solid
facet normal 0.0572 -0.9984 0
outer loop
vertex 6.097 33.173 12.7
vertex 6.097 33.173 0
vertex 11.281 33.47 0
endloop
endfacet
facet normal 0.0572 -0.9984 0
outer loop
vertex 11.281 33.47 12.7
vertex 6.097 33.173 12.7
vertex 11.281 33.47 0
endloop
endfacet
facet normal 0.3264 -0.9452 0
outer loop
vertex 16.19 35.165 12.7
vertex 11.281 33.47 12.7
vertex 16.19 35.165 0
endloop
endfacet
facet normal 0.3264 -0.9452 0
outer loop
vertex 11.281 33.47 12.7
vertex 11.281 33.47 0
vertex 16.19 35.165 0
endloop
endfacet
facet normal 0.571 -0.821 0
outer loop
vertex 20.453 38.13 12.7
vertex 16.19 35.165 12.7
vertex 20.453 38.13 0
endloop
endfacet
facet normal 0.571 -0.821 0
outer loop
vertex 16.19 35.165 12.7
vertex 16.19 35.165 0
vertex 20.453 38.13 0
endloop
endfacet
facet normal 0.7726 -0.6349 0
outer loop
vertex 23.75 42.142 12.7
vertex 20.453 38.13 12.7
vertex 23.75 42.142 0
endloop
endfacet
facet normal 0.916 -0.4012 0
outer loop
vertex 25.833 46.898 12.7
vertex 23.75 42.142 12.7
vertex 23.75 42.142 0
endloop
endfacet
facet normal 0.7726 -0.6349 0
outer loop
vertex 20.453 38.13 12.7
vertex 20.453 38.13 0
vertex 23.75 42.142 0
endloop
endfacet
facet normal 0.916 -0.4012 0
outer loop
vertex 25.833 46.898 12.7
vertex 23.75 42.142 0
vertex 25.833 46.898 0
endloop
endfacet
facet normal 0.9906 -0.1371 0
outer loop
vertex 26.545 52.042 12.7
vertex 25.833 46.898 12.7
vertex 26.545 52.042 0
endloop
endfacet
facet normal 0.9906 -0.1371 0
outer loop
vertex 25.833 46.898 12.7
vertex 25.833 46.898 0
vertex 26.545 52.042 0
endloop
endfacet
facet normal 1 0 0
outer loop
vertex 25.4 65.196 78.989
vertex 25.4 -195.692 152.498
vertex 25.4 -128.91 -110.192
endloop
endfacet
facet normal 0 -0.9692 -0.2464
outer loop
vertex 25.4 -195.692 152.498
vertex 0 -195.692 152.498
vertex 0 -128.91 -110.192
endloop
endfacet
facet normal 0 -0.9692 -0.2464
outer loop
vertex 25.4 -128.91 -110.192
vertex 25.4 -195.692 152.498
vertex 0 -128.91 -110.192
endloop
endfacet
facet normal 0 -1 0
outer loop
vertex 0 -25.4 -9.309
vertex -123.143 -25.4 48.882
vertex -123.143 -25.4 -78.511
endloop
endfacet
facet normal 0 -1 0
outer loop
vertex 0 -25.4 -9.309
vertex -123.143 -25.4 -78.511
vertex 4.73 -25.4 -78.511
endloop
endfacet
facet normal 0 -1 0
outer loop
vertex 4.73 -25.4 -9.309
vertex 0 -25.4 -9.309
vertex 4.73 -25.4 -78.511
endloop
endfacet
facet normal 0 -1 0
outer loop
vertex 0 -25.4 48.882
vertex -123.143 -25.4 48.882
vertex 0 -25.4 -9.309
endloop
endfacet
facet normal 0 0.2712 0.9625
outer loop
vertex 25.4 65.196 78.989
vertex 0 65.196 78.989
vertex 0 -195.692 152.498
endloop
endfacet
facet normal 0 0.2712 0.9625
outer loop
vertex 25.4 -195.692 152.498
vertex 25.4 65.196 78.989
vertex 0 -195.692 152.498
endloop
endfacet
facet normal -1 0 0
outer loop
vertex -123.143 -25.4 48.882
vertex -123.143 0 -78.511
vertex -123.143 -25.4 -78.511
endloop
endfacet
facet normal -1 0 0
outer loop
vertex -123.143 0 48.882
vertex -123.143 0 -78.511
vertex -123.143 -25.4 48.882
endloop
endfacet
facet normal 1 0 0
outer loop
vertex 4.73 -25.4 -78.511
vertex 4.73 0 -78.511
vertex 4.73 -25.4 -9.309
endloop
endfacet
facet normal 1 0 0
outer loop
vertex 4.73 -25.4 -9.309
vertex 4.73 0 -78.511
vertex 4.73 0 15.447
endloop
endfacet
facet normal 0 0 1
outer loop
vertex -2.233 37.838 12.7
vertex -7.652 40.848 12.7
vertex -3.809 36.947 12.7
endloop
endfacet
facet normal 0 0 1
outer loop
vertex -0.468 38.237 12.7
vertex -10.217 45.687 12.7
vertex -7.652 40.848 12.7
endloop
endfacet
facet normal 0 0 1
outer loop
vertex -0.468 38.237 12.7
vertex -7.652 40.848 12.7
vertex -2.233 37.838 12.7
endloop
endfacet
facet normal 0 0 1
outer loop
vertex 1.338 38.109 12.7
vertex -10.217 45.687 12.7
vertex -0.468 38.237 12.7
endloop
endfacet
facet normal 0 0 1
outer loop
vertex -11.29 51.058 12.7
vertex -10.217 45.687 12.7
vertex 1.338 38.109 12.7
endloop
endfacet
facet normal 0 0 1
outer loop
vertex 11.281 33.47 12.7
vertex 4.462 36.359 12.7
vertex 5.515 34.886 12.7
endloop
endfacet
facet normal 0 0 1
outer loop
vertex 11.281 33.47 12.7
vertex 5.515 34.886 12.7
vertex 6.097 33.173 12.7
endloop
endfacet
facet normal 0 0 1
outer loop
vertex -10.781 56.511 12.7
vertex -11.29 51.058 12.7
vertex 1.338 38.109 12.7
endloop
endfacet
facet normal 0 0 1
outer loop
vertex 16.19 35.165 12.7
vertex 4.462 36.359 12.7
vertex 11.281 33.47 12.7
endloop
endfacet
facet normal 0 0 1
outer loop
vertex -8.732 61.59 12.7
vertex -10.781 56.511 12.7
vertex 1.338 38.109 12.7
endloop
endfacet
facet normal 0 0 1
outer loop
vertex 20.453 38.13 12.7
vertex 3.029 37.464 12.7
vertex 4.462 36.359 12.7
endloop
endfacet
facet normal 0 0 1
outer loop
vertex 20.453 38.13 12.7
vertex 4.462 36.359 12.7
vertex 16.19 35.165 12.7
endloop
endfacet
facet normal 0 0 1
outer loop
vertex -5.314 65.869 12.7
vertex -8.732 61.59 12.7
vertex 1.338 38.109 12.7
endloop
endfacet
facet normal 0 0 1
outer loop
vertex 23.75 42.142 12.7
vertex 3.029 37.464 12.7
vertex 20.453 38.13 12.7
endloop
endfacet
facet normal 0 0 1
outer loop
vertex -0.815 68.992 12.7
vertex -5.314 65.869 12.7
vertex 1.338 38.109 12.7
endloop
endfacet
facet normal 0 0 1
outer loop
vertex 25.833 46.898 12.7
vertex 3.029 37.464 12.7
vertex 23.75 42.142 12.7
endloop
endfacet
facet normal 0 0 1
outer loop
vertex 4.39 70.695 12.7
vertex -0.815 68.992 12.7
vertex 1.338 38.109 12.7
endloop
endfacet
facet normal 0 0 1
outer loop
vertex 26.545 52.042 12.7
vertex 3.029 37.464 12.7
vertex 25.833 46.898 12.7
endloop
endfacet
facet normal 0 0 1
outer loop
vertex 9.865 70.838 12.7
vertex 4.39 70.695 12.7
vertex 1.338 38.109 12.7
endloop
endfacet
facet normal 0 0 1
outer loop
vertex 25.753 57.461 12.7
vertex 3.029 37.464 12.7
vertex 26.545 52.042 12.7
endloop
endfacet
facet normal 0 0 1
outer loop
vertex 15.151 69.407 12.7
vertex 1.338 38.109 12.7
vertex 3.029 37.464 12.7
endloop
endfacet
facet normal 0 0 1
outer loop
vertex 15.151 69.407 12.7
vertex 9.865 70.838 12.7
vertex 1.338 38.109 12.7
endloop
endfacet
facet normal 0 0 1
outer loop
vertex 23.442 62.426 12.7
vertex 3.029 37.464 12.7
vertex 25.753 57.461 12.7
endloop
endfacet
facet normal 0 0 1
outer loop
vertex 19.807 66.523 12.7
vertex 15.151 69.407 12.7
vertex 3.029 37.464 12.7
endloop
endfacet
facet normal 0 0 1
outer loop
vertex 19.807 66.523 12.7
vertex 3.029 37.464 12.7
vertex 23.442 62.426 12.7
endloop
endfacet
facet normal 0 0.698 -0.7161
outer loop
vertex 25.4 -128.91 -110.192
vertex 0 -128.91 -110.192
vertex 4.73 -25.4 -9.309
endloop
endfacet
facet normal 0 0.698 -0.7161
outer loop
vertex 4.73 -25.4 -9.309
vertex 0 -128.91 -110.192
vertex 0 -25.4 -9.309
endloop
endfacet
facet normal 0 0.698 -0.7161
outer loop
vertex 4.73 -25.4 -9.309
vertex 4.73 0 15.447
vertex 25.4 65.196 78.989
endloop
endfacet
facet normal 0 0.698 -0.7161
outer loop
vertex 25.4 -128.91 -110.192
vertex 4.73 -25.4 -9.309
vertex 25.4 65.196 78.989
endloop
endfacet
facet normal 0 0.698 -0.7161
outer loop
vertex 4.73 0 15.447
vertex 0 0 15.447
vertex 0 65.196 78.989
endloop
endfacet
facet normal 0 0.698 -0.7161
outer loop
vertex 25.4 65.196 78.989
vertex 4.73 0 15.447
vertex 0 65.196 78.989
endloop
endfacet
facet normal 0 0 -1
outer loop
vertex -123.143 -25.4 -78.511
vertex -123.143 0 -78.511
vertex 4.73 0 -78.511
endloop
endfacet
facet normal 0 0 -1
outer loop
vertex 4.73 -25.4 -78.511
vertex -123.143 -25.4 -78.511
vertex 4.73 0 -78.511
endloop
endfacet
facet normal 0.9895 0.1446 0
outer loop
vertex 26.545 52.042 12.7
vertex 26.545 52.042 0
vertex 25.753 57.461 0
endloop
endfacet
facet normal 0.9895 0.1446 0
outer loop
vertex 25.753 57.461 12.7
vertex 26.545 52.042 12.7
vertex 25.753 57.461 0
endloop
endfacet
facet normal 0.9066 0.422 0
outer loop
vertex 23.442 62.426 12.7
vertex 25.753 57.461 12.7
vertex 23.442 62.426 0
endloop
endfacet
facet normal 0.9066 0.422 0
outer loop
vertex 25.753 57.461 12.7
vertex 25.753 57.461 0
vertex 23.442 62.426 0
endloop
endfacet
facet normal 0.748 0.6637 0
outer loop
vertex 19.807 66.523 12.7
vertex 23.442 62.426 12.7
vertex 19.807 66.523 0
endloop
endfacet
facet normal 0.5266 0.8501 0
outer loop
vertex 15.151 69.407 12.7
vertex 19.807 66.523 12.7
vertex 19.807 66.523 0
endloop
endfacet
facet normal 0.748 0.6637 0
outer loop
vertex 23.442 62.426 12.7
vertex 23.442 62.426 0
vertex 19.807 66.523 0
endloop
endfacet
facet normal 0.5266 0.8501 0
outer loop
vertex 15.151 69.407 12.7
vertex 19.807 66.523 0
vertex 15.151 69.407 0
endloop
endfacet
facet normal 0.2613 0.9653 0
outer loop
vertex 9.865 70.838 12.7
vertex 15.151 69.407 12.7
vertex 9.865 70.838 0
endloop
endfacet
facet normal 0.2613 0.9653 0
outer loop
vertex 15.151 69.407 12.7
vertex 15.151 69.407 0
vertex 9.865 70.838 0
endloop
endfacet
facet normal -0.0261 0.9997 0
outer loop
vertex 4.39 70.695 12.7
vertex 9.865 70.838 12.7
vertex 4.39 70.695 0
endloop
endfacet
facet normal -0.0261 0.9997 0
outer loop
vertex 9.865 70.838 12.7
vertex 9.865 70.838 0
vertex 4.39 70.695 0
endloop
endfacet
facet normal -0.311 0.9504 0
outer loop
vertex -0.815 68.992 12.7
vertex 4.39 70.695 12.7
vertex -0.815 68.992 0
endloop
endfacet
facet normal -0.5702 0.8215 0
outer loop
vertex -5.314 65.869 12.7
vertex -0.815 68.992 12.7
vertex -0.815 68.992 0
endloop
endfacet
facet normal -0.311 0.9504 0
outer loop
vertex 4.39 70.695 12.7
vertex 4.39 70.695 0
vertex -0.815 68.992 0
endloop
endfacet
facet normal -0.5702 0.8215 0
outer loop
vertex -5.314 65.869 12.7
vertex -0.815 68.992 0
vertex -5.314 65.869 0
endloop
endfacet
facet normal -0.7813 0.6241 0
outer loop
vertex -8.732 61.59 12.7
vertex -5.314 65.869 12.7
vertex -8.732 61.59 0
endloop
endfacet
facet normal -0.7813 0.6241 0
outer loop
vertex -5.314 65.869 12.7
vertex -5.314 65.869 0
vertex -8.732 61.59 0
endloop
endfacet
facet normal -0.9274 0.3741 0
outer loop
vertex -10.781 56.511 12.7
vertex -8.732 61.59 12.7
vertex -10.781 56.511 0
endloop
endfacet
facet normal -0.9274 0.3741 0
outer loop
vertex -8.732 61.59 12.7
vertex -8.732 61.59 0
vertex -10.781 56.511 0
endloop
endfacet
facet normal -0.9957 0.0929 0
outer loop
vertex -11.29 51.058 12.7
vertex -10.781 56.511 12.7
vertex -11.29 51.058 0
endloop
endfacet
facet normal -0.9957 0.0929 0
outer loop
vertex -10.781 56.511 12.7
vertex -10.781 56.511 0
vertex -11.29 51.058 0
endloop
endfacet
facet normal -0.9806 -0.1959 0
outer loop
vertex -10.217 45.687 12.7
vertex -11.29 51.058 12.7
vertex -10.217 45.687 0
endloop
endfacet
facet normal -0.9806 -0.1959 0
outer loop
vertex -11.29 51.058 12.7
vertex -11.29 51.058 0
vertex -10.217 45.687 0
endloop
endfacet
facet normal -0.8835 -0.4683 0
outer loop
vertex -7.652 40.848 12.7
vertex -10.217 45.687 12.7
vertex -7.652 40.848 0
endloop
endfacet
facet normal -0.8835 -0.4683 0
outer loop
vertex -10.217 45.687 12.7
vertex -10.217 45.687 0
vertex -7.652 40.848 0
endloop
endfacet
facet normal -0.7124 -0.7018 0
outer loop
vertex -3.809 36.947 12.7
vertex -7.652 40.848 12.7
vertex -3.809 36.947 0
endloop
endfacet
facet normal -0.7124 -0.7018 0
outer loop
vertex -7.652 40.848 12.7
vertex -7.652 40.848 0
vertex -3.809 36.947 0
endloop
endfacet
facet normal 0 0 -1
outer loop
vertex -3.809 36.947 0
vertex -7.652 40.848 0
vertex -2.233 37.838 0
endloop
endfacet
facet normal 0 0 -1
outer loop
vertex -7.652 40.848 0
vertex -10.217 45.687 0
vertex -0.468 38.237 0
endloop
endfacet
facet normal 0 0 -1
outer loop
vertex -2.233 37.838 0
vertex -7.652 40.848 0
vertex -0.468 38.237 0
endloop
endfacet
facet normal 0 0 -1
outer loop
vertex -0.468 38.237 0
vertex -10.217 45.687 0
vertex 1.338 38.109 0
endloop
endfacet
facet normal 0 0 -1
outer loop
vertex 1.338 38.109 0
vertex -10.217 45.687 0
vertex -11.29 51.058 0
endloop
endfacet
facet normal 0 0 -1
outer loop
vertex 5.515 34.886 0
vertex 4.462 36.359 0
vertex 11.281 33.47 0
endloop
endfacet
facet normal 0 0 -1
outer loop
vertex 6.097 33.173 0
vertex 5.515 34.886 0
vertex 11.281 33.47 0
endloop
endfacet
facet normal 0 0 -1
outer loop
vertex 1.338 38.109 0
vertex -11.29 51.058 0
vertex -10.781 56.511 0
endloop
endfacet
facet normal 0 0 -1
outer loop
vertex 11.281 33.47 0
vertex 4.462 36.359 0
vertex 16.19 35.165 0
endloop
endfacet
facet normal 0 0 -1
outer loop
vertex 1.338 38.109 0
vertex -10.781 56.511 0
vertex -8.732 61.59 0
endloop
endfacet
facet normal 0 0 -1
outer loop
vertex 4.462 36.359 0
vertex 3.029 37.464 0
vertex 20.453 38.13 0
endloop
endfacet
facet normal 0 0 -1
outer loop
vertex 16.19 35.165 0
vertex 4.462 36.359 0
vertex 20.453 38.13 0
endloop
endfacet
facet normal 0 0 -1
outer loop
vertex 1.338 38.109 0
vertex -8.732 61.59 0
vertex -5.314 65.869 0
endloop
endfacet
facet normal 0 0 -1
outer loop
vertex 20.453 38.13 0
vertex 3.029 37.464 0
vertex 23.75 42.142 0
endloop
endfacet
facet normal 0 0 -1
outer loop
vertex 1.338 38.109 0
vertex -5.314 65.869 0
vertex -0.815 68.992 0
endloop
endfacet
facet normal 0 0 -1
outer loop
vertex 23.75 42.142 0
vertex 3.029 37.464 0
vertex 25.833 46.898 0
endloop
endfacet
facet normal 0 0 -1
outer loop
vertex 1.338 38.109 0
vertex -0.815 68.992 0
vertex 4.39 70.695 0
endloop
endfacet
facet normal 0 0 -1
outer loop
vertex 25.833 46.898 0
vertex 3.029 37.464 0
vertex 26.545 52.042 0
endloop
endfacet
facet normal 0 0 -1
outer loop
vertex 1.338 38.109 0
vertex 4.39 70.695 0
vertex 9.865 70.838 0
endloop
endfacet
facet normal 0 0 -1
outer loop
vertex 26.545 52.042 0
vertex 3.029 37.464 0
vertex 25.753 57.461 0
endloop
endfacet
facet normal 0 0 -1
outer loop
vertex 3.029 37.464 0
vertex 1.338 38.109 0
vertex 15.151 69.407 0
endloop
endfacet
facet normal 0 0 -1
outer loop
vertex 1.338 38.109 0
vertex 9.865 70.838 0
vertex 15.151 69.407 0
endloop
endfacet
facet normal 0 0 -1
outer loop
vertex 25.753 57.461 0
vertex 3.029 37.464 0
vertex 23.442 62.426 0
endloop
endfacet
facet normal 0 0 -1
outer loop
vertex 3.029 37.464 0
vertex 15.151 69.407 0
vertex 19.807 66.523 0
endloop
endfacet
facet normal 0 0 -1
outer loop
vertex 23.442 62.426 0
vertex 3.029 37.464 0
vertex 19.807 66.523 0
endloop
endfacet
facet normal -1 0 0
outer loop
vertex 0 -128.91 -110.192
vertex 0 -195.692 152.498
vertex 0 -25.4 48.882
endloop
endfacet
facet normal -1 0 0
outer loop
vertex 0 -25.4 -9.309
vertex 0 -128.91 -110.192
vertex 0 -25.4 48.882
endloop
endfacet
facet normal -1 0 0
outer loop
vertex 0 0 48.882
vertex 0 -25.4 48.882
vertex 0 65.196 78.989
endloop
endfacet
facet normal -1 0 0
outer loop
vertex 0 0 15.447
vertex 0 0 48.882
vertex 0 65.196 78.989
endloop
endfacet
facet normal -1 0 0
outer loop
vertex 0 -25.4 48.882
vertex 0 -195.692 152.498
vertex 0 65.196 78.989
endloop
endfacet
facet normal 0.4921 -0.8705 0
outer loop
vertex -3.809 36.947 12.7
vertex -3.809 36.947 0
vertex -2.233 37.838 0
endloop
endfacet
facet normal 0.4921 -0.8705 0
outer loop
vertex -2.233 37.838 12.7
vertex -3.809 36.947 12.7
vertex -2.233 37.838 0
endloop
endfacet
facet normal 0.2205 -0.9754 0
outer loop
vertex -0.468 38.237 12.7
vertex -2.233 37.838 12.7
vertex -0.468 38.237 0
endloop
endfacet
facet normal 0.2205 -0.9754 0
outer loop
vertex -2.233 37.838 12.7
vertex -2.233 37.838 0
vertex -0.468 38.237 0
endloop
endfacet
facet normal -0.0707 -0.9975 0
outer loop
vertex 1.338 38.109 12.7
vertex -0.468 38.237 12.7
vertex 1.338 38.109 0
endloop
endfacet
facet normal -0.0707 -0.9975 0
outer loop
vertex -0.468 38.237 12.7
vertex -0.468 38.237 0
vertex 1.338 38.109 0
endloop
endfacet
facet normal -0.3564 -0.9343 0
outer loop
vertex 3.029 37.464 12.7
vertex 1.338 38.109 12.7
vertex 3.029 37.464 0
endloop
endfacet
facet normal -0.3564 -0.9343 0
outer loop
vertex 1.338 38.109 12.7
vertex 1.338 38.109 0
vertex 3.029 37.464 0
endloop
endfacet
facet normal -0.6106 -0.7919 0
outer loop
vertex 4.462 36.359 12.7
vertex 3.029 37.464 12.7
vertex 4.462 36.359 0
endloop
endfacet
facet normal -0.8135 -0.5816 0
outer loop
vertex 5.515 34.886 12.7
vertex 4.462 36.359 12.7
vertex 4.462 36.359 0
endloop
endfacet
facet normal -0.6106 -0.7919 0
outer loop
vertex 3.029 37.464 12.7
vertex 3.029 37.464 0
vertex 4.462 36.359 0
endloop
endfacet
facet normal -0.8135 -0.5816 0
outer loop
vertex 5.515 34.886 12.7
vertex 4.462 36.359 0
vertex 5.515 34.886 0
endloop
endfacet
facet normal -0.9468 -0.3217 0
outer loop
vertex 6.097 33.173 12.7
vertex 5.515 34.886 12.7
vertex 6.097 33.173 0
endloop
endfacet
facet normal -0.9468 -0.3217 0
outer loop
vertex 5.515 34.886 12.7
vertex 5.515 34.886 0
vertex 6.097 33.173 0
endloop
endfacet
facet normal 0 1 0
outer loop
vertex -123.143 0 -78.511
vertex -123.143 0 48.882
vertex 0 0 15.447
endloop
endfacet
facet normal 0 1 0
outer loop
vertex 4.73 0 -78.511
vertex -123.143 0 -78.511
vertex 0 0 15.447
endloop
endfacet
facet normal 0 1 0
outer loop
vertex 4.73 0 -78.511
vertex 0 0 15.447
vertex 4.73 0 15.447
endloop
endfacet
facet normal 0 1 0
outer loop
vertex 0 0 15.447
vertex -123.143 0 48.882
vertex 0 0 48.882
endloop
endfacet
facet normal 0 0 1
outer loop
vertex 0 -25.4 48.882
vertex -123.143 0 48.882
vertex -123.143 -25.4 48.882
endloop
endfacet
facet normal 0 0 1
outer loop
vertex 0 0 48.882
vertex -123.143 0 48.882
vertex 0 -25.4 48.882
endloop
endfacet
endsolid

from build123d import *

# Parameters (mm, degrees)
F0_W     = 127.872322
F0_H     = 127.393622
F1_DEPTH = 25.4
F3_DEPTH = 12.7
F5_DEPTH = 25.4


with BuildPart() as f1:
    # F0 (on Front) → F1 (new body)
    with BuildSketch(Plane.XZ):
        with Locations((-59.20664, -14.814315)):
            Rectangle(F0_W, F0_H)
    extrude(amount=F1_DEPTH)

    # F4 (on Right) → F5 (join)
    with BuildSketch(Plane.YZ):
        Polygon((-128.909611, -110.192191), (65.195793, 78.98877), (-195.692427, 152.4985), align=None)
    extrude(amount=F5_DEPTH)


with BuildPart() as f3:
    # F2 (on Top) → F3 (new body)
    with BuildSketch(Plane.XY):
        with BuildLine():
            ThreePointArc((-3.808539, 36.946655), (2.206931, 37.848496), (6.097252, 33.172538))
            ThreePointArc((6.097252, 33.172538), (20.452664, 38.130037), (26.544886, 52.041885))
            ThreePointArc((26.544886, 52.041885), (-0.814821, 68.991784), (-3.808539, 36.946655))
        make_face()
    extrude(amount=F3_DEPTH)


solid = Compound([f1.part, f3.part])
